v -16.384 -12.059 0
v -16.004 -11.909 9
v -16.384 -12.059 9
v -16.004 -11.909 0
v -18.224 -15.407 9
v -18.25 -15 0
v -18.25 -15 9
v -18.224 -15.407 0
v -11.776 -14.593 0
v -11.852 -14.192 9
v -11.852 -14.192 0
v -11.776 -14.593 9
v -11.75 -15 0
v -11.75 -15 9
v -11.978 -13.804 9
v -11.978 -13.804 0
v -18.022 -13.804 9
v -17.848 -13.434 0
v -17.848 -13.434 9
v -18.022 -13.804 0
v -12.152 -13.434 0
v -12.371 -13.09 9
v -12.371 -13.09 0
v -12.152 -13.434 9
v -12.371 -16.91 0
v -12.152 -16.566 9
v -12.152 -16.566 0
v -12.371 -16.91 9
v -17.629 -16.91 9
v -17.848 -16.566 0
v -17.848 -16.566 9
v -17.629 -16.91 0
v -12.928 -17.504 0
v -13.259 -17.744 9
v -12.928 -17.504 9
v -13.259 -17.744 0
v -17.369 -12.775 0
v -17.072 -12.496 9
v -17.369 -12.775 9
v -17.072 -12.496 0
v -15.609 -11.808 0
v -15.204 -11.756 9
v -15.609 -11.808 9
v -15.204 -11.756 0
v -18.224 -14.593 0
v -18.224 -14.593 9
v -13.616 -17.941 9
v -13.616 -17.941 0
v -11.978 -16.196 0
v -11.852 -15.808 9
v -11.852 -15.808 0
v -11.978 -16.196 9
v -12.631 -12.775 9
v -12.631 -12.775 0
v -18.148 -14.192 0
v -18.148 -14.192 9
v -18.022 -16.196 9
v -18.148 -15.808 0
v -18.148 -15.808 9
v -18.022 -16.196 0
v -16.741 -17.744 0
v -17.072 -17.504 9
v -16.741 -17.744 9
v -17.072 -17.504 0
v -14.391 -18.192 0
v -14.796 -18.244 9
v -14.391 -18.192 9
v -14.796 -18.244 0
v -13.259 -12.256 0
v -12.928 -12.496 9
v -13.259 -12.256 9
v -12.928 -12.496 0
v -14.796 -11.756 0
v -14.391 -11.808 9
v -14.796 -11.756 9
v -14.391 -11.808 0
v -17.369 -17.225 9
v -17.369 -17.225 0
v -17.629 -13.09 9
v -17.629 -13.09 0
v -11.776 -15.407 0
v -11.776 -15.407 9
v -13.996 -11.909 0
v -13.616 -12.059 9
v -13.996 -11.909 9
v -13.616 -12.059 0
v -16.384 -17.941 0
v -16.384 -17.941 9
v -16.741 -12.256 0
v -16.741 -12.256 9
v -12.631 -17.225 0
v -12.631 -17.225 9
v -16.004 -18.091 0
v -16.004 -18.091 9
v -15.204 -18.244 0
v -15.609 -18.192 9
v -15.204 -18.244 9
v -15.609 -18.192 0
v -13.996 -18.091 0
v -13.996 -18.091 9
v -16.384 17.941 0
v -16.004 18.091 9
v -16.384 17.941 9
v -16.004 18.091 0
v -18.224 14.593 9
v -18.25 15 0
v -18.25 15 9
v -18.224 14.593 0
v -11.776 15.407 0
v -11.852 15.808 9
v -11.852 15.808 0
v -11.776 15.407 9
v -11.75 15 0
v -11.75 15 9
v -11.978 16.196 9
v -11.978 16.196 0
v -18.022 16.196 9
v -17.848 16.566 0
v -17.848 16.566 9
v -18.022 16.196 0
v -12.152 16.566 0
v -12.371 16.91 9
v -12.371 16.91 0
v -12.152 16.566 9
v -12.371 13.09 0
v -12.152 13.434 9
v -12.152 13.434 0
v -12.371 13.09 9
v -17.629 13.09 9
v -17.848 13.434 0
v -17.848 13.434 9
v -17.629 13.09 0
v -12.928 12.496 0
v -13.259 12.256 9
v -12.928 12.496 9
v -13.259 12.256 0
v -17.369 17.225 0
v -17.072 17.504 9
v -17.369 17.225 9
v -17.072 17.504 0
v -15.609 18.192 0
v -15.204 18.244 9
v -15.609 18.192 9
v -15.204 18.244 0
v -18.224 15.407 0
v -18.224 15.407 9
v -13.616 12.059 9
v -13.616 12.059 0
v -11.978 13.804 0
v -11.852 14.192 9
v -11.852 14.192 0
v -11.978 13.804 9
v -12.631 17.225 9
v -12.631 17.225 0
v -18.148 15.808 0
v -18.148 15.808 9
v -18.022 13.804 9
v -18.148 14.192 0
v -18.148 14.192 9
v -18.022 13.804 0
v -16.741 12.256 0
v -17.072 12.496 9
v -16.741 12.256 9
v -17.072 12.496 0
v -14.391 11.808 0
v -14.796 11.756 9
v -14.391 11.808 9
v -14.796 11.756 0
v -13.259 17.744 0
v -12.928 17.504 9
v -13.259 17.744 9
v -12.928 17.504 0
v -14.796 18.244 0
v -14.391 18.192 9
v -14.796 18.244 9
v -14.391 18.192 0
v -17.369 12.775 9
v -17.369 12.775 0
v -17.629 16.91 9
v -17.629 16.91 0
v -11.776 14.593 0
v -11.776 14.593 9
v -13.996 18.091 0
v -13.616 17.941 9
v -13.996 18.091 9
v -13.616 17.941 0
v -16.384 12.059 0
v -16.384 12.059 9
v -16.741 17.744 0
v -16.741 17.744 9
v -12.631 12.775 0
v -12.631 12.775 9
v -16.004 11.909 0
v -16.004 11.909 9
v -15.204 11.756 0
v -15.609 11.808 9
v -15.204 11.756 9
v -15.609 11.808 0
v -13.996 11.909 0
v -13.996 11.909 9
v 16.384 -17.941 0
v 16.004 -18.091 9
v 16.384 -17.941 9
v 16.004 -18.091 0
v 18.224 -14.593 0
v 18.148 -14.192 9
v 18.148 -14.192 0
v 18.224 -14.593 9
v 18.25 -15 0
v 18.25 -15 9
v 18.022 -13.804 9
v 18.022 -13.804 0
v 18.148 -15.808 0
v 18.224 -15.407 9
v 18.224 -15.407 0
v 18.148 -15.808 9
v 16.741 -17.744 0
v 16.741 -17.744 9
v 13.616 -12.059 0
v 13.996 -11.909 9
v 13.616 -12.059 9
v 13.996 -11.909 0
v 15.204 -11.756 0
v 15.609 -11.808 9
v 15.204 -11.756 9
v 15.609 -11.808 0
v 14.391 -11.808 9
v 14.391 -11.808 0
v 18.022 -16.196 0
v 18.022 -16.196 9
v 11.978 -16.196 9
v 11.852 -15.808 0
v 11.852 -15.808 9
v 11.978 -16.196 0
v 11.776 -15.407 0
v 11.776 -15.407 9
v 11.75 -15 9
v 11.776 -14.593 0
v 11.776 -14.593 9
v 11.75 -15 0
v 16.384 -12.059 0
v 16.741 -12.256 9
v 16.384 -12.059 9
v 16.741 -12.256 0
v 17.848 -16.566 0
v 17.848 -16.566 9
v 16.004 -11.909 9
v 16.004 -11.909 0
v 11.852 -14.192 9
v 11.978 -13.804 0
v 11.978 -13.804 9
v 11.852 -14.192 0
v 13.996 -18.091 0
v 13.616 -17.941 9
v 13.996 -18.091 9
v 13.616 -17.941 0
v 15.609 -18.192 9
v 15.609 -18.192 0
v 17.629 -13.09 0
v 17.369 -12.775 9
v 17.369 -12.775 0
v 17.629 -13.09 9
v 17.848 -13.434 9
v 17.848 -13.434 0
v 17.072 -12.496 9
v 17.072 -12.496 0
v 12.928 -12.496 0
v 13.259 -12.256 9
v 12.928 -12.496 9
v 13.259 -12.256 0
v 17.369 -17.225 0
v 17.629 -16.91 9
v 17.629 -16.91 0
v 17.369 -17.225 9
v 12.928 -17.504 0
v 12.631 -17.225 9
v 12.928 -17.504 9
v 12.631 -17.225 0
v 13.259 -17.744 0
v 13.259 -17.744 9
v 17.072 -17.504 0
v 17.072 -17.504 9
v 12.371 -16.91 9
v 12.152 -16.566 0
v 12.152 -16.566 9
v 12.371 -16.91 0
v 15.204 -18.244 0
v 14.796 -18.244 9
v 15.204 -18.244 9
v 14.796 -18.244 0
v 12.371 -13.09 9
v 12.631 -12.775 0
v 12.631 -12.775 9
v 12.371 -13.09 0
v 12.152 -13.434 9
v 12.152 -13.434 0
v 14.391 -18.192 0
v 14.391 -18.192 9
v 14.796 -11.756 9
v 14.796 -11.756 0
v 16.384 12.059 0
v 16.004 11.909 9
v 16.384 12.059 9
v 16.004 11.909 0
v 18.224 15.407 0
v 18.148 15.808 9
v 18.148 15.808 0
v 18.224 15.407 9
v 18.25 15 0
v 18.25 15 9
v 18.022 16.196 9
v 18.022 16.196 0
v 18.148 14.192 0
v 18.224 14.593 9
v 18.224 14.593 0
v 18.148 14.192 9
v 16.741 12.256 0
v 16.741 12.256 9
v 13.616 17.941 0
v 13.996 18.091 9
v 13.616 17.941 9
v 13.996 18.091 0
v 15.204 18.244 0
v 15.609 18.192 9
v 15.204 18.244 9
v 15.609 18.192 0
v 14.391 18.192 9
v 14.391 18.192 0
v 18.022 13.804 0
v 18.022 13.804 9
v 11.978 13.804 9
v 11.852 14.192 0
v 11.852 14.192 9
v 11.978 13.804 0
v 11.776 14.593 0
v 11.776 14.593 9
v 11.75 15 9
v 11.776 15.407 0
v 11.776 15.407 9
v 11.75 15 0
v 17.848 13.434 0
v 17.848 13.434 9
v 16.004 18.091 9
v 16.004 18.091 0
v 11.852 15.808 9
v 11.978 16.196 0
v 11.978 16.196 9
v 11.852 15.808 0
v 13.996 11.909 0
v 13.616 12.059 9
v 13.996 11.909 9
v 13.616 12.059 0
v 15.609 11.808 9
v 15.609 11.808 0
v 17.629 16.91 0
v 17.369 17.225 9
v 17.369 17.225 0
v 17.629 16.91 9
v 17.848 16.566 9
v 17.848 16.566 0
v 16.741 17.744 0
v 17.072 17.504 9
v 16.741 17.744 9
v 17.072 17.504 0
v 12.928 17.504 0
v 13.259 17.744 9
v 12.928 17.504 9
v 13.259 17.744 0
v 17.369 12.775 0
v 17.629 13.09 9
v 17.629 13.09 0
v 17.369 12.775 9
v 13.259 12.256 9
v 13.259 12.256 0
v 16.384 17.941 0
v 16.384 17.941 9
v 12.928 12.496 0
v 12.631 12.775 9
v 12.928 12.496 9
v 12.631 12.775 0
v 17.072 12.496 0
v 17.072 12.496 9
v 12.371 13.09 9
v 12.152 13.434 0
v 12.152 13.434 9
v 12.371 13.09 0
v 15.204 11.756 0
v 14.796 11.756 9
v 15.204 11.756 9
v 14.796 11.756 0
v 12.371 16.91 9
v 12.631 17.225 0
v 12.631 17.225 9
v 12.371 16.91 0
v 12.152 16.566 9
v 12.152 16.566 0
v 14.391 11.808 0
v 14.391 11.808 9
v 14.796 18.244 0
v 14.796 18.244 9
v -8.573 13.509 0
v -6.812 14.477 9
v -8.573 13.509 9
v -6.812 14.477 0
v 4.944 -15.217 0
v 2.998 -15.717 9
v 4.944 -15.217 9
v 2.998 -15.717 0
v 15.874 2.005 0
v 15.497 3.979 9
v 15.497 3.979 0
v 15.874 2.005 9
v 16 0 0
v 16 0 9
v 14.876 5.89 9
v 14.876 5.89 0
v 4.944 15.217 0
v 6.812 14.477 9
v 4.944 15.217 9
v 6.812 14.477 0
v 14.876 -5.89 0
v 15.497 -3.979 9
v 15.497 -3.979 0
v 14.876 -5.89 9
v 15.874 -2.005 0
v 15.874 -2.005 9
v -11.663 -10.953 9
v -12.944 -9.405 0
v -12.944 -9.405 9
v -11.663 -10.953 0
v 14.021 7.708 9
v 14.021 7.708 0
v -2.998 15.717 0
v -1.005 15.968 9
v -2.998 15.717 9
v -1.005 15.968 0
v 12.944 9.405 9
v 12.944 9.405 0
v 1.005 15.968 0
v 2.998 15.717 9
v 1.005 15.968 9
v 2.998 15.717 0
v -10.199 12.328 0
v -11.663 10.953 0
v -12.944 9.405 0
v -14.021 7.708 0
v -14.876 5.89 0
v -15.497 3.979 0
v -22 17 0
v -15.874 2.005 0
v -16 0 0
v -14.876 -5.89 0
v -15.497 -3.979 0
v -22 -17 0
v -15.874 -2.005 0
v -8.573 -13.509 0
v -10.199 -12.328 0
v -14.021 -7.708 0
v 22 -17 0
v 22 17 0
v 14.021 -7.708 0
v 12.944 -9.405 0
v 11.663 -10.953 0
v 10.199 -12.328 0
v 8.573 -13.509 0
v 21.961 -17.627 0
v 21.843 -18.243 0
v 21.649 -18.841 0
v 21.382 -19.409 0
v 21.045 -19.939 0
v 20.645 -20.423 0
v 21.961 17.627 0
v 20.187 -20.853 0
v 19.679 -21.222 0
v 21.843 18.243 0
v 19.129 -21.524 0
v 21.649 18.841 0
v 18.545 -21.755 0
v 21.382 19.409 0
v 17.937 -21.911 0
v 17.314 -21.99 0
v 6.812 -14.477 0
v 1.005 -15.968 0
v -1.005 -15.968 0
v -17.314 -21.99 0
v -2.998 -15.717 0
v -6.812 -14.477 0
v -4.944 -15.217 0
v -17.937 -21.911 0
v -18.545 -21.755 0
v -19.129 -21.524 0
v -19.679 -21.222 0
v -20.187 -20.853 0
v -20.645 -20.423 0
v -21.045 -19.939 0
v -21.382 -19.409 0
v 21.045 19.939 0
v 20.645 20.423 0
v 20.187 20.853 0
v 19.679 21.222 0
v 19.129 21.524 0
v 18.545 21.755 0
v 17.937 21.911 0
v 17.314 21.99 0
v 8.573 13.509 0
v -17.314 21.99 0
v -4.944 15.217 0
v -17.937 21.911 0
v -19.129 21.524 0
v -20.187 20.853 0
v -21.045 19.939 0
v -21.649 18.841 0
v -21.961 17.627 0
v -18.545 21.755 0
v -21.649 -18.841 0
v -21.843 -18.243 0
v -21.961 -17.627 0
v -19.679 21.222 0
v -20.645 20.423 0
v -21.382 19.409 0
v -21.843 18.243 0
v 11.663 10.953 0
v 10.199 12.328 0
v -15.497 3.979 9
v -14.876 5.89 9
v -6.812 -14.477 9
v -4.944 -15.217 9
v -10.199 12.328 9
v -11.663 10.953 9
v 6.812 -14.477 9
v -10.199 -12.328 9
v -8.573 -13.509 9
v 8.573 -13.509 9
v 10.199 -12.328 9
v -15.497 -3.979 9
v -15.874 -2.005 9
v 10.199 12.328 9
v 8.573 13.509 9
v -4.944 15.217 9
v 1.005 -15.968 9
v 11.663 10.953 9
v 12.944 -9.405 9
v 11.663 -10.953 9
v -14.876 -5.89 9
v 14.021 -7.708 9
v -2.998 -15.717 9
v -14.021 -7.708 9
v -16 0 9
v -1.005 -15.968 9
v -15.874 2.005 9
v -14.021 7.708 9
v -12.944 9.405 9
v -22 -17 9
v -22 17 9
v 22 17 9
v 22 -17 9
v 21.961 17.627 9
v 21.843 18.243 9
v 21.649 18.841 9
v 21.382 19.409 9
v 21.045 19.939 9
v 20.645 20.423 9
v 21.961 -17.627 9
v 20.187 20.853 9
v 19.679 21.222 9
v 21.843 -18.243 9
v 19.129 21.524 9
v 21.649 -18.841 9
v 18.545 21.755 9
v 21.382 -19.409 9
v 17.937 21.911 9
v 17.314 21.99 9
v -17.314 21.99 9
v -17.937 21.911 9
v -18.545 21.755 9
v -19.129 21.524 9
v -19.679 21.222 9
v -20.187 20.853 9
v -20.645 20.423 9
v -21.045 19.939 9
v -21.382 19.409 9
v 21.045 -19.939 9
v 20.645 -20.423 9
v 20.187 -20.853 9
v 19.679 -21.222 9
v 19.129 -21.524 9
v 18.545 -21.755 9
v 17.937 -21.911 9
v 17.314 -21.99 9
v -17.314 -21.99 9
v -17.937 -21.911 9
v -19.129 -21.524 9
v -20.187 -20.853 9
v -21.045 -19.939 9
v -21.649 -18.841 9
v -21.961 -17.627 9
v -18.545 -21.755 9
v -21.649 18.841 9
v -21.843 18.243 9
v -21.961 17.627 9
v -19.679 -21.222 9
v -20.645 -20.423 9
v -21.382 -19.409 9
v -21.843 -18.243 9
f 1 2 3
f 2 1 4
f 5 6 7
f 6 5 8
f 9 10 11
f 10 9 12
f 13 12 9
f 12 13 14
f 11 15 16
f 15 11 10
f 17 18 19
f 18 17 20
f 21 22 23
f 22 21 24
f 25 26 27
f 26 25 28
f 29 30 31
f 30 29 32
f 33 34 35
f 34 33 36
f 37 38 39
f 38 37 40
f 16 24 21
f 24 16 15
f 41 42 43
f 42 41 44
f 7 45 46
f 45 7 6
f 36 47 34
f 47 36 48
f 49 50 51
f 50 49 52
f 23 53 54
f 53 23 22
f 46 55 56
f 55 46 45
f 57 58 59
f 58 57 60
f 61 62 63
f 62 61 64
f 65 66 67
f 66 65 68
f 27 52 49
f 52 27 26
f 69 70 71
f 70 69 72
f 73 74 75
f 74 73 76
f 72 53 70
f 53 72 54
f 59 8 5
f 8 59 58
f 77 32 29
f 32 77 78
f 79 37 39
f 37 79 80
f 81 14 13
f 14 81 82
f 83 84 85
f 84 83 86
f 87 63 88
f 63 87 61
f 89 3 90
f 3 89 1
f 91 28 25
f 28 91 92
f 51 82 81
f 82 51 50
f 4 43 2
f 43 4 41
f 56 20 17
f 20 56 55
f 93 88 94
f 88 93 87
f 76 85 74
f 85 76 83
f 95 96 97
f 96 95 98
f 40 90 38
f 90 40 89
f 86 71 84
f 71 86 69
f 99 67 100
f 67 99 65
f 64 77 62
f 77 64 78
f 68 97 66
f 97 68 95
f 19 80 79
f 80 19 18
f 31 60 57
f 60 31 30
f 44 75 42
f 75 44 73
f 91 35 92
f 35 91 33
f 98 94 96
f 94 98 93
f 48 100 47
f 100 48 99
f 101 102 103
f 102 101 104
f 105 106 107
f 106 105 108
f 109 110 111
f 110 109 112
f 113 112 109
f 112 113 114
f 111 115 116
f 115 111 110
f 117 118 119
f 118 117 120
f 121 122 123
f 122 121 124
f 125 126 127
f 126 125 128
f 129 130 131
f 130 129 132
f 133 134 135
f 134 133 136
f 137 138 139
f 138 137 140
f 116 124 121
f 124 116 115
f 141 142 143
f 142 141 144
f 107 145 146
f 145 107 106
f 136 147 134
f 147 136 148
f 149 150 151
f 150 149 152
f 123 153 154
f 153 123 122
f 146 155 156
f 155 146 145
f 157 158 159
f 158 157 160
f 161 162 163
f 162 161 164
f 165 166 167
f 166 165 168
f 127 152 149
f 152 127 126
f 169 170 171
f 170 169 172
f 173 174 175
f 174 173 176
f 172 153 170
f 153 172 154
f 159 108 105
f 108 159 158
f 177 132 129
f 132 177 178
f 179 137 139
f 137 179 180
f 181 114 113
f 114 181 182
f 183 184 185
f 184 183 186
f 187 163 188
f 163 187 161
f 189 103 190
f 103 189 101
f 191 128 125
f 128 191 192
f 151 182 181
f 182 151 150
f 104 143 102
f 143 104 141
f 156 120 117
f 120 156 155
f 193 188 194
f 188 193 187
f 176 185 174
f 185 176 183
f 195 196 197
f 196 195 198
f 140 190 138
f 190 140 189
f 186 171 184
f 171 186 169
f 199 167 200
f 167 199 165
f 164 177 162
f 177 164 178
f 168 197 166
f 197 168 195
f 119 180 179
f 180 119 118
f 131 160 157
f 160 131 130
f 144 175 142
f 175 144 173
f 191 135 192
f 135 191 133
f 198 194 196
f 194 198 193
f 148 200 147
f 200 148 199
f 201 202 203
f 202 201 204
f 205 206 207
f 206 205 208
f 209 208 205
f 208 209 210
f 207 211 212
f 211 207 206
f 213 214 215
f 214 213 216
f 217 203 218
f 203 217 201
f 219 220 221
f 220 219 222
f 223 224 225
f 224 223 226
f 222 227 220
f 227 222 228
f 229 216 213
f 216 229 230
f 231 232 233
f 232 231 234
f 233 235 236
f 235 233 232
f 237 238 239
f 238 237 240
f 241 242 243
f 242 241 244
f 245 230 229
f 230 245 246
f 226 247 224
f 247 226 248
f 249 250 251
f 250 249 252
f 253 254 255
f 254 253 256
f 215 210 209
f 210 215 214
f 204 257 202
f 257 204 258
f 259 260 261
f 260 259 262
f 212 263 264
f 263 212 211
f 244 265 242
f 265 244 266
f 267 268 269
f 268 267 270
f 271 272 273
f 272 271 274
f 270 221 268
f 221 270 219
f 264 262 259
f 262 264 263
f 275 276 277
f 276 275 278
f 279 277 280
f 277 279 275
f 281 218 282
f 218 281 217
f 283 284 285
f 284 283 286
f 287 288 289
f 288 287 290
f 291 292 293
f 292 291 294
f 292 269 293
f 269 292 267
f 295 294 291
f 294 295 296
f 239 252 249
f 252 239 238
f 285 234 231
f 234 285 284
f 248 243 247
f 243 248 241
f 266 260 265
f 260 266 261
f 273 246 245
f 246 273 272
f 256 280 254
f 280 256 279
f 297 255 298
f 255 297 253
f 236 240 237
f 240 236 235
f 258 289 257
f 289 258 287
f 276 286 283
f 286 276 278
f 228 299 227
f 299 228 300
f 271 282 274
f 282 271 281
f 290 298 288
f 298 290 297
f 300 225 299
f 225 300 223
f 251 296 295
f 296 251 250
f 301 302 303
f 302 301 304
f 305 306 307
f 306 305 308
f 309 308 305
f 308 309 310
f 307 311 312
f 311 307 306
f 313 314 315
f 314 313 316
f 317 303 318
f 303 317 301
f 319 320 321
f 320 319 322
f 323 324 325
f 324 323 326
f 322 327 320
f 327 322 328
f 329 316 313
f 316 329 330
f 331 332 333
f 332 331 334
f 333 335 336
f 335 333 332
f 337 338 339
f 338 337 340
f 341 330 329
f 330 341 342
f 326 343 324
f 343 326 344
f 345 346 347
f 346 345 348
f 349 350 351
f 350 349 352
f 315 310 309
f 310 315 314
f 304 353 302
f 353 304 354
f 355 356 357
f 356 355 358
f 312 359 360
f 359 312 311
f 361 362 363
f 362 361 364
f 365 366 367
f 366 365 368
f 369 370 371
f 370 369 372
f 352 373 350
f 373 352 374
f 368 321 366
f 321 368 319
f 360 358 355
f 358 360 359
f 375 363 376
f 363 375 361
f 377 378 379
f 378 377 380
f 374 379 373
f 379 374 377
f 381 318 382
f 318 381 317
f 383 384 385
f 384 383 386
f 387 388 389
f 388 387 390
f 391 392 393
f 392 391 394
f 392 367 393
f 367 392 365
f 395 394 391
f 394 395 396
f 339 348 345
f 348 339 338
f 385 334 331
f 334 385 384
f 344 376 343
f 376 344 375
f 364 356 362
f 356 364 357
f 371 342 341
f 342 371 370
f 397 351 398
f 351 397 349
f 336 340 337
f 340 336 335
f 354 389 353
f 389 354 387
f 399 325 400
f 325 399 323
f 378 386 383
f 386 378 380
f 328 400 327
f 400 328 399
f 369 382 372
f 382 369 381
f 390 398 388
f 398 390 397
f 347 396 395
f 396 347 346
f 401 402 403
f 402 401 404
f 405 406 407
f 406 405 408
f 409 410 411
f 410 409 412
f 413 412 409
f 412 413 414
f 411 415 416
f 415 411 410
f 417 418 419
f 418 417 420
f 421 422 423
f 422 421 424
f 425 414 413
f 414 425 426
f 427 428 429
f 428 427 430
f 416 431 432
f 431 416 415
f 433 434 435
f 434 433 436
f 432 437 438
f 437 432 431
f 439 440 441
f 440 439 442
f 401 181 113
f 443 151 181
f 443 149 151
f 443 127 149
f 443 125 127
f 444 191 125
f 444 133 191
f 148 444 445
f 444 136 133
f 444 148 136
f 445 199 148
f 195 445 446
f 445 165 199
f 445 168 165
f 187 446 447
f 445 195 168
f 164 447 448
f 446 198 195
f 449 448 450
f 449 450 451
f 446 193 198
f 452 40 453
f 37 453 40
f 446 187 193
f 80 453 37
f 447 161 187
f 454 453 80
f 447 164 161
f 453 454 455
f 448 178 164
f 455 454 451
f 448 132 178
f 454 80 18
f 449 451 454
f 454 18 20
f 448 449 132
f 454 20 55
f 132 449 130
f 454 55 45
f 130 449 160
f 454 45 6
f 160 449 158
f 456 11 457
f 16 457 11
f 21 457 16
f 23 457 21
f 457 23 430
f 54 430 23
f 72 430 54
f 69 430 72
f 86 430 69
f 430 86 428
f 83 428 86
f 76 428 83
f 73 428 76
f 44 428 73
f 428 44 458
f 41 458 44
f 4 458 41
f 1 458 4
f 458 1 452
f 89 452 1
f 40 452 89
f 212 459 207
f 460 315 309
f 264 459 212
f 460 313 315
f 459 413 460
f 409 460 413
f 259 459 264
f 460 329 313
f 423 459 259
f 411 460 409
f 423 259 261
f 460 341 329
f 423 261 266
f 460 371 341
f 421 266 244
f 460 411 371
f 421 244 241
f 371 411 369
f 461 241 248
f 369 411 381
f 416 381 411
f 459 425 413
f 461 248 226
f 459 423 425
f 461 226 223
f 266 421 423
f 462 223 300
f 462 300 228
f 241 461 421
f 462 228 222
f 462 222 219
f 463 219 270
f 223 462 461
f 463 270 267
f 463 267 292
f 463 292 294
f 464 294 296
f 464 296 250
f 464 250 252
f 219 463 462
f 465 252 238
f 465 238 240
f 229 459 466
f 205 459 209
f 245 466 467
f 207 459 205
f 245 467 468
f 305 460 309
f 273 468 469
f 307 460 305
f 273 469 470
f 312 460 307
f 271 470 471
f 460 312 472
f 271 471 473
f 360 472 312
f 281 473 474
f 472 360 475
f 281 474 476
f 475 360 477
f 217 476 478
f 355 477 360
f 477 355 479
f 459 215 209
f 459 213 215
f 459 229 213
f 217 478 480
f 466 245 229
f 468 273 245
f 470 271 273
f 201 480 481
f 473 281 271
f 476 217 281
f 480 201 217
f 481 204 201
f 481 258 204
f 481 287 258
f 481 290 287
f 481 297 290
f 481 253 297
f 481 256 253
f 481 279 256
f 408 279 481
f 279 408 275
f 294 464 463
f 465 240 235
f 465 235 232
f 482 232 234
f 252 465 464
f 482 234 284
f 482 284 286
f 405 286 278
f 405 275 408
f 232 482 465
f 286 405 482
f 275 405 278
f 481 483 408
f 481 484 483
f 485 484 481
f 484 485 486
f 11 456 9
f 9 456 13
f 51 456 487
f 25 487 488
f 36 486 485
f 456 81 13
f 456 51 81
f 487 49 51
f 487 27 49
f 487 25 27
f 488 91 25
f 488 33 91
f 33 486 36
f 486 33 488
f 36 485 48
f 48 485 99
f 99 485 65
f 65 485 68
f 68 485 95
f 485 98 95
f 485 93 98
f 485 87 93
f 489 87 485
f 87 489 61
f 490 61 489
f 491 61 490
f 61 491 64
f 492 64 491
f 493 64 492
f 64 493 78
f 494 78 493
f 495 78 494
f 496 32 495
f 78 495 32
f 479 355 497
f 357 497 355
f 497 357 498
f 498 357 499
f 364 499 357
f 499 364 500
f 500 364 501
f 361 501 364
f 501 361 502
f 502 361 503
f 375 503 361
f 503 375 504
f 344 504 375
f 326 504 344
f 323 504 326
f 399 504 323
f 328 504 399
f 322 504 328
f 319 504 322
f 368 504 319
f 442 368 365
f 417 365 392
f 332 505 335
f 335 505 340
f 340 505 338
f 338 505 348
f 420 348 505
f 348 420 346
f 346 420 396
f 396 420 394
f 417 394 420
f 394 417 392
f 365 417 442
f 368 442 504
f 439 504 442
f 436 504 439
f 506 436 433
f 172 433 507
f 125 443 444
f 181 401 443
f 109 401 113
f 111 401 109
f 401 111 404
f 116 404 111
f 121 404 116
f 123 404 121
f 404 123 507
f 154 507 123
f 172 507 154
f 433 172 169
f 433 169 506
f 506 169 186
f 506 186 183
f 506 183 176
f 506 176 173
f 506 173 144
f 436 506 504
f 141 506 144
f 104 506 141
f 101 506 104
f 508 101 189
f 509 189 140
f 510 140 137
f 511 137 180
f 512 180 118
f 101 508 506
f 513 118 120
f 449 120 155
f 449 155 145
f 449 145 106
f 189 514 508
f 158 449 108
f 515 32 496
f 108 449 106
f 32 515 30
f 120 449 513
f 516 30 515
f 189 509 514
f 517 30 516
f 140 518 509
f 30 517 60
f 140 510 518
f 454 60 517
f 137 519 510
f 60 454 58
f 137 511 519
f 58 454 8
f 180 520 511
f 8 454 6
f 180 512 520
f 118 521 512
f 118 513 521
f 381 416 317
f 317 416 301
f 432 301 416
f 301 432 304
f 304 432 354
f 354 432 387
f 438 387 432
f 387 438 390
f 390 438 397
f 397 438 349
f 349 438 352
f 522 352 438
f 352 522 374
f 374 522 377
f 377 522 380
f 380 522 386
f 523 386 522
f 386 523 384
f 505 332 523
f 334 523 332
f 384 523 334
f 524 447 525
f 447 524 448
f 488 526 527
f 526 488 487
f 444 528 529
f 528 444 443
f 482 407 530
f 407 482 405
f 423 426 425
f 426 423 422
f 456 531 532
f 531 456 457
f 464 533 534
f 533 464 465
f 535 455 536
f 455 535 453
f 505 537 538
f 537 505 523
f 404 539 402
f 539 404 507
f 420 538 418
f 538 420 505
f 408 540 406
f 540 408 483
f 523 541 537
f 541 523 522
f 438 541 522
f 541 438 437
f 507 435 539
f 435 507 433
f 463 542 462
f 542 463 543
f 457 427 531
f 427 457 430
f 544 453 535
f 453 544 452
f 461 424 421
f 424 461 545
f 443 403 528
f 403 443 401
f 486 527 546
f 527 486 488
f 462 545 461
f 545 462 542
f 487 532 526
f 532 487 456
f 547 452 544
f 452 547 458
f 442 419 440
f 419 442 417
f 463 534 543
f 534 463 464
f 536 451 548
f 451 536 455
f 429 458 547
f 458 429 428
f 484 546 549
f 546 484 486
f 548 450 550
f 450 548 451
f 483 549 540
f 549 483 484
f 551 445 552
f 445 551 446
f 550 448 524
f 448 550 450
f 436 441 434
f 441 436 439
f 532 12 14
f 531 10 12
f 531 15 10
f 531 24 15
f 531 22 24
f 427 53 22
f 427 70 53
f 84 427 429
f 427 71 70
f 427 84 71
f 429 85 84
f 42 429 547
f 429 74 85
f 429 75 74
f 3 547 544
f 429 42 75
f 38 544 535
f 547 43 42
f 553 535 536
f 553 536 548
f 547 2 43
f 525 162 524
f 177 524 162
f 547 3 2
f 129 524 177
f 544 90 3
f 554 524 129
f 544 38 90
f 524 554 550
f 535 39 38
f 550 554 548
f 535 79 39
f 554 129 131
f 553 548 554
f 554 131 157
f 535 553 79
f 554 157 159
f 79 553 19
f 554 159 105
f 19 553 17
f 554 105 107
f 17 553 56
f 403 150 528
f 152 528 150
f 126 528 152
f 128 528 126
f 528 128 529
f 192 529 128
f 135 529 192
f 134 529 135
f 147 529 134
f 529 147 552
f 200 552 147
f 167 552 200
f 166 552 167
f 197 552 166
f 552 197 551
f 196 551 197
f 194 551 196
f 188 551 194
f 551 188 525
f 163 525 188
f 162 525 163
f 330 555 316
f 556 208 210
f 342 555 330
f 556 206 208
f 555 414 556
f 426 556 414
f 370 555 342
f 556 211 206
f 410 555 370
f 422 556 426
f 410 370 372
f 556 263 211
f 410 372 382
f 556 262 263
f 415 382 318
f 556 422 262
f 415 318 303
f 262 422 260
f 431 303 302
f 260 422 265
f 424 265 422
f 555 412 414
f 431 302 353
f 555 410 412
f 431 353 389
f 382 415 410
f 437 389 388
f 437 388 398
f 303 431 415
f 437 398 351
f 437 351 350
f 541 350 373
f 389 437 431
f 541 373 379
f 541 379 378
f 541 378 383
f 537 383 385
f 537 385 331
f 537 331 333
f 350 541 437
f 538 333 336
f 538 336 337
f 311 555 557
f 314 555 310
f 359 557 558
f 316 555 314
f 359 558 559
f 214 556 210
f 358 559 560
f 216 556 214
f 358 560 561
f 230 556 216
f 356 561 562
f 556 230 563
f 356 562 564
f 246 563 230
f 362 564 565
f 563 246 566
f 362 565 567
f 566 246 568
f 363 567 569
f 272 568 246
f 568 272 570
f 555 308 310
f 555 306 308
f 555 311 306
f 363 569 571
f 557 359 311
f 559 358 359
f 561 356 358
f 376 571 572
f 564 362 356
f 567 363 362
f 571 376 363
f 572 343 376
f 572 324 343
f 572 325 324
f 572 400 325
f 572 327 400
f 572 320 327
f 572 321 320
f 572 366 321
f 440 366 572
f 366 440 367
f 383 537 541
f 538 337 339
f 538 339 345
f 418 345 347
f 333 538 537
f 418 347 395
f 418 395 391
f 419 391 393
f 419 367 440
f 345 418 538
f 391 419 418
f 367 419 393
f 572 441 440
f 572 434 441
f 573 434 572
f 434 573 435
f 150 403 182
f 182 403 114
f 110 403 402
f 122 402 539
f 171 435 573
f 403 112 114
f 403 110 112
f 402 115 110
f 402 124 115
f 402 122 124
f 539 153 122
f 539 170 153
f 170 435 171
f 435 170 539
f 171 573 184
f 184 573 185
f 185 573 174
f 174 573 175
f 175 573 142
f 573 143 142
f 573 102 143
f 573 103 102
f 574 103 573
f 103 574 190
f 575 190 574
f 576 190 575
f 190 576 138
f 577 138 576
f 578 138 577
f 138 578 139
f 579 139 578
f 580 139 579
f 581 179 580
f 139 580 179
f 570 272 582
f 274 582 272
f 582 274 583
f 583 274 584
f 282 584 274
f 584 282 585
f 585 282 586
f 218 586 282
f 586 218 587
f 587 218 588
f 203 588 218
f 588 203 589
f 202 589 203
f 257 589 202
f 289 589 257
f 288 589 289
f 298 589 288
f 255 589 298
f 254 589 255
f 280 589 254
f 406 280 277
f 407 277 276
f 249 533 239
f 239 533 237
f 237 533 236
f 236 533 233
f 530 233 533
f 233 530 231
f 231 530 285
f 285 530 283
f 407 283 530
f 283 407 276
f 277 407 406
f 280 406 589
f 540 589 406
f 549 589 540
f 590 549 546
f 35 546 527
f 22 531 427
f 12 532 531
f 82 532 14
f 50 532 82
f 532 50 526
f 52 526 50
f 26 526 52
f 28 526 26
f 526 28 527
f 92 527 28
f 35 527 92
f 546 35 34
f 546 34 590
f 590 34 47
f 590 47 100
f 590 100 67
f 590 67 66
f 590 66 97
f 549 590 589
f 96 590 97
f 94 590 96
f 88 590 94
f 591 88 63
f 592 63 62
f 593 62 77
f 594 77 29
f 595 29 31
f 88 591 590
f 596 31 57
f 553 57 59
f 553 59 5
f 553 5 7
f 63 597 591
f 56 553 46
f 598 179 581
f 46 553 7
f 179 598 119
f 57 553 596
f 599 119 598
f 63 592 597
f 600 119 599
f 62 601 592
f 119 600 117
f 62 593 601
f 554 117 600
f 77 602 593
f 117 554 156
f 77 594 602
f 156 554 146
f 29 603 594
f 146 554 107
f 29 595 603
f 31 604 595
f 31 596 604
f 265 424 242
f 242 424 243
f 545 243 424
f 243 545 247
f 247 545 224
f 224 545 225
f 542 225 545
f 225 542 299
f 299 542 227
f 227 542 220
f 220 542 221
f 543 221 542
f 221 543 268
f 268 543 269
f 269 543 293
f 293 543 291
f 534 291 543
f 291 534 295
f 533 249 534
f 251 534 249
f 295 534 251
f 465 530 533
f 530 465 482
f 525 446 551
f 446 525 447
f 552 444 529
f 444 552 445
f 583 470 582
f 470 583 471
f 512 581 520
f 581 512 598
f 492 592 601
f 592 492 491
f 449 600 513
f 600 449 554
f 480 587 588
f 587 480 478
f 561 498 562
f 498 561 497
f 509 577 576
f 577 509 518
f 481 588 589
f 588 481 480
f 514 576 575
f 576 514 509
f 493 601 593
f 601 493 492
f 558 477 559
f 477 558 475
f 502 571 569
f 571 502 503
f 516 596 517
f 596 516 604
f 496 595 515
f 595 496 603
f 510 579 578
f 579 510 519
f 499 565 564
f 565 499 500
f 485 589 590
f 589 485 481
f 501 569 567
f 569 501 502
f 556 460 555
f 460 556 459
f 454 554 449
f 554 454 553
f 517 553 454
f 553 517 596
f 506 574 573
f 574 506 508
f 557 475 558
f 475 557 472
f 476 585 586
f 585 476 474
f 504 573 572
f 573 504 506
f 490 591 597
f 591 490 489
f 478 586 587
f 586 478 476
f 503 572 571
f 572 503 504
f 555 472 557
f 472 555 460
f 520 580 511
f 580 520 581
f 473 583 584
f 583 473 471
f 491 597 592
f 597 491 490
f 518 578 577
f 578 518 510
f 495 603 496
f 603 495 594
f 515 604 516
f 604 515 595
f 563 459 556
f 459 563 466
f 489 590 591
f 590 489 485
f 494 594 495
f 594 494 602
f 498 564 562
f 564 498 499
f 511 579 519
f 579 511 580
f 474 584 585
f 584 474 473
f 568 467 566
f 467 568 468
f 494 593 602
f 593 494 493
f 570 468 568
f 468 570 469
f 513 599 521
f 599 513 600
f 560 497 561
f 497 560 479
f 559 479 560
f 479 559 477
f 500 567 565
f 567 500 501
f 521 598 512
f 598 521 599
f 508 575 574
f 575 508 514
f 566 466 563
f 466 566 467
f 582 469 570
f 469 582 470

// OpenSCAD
$fn = 50;


difference() {
	union() {
		hull() {
			translate(v = [-17.0000000000, 17.0000000000, 0]) {
				cylinder(h = 9, r = 5);
			}
			translate(v = [17.0000000000, 17.0000000000, 0]) {
				cylinder(h = 9, r = 5);
			}
			translate(v = [-17.0000000000, -17.0000000000, 0]) {
				cylinder(h = 9, r = 5);
			}
			translate(v = [17.0000000000, -17.0000000000, 0]) {
				cylinder(h = 9, r = 5);
			}
		}
	}
	union() {
		#translate(v = [-15.0000000000, -15.0000000000, -100.0000000000]) {
			cylinder(h = 200, r = 3.2500000000);
		}
		#translate(v = [-15.0000000000, 15.0000000000, -100.0000000000]) {
			cylinder(h = 200, r = 3.2500000000);
		}
		#translate(v = [15.0000000000, -15.0000000000, -100.0000000000]) {
			cylinder(h = 200, r = 3.2500000000);
		}
		#translate(v = [15.0000000000, 15.0000000000, -100.0000000000]) {
			cylinder(h = 200, r = 3.2500000000);
		}
		#cylinder(h = 9, r = 16.0000000000);
	}
}
